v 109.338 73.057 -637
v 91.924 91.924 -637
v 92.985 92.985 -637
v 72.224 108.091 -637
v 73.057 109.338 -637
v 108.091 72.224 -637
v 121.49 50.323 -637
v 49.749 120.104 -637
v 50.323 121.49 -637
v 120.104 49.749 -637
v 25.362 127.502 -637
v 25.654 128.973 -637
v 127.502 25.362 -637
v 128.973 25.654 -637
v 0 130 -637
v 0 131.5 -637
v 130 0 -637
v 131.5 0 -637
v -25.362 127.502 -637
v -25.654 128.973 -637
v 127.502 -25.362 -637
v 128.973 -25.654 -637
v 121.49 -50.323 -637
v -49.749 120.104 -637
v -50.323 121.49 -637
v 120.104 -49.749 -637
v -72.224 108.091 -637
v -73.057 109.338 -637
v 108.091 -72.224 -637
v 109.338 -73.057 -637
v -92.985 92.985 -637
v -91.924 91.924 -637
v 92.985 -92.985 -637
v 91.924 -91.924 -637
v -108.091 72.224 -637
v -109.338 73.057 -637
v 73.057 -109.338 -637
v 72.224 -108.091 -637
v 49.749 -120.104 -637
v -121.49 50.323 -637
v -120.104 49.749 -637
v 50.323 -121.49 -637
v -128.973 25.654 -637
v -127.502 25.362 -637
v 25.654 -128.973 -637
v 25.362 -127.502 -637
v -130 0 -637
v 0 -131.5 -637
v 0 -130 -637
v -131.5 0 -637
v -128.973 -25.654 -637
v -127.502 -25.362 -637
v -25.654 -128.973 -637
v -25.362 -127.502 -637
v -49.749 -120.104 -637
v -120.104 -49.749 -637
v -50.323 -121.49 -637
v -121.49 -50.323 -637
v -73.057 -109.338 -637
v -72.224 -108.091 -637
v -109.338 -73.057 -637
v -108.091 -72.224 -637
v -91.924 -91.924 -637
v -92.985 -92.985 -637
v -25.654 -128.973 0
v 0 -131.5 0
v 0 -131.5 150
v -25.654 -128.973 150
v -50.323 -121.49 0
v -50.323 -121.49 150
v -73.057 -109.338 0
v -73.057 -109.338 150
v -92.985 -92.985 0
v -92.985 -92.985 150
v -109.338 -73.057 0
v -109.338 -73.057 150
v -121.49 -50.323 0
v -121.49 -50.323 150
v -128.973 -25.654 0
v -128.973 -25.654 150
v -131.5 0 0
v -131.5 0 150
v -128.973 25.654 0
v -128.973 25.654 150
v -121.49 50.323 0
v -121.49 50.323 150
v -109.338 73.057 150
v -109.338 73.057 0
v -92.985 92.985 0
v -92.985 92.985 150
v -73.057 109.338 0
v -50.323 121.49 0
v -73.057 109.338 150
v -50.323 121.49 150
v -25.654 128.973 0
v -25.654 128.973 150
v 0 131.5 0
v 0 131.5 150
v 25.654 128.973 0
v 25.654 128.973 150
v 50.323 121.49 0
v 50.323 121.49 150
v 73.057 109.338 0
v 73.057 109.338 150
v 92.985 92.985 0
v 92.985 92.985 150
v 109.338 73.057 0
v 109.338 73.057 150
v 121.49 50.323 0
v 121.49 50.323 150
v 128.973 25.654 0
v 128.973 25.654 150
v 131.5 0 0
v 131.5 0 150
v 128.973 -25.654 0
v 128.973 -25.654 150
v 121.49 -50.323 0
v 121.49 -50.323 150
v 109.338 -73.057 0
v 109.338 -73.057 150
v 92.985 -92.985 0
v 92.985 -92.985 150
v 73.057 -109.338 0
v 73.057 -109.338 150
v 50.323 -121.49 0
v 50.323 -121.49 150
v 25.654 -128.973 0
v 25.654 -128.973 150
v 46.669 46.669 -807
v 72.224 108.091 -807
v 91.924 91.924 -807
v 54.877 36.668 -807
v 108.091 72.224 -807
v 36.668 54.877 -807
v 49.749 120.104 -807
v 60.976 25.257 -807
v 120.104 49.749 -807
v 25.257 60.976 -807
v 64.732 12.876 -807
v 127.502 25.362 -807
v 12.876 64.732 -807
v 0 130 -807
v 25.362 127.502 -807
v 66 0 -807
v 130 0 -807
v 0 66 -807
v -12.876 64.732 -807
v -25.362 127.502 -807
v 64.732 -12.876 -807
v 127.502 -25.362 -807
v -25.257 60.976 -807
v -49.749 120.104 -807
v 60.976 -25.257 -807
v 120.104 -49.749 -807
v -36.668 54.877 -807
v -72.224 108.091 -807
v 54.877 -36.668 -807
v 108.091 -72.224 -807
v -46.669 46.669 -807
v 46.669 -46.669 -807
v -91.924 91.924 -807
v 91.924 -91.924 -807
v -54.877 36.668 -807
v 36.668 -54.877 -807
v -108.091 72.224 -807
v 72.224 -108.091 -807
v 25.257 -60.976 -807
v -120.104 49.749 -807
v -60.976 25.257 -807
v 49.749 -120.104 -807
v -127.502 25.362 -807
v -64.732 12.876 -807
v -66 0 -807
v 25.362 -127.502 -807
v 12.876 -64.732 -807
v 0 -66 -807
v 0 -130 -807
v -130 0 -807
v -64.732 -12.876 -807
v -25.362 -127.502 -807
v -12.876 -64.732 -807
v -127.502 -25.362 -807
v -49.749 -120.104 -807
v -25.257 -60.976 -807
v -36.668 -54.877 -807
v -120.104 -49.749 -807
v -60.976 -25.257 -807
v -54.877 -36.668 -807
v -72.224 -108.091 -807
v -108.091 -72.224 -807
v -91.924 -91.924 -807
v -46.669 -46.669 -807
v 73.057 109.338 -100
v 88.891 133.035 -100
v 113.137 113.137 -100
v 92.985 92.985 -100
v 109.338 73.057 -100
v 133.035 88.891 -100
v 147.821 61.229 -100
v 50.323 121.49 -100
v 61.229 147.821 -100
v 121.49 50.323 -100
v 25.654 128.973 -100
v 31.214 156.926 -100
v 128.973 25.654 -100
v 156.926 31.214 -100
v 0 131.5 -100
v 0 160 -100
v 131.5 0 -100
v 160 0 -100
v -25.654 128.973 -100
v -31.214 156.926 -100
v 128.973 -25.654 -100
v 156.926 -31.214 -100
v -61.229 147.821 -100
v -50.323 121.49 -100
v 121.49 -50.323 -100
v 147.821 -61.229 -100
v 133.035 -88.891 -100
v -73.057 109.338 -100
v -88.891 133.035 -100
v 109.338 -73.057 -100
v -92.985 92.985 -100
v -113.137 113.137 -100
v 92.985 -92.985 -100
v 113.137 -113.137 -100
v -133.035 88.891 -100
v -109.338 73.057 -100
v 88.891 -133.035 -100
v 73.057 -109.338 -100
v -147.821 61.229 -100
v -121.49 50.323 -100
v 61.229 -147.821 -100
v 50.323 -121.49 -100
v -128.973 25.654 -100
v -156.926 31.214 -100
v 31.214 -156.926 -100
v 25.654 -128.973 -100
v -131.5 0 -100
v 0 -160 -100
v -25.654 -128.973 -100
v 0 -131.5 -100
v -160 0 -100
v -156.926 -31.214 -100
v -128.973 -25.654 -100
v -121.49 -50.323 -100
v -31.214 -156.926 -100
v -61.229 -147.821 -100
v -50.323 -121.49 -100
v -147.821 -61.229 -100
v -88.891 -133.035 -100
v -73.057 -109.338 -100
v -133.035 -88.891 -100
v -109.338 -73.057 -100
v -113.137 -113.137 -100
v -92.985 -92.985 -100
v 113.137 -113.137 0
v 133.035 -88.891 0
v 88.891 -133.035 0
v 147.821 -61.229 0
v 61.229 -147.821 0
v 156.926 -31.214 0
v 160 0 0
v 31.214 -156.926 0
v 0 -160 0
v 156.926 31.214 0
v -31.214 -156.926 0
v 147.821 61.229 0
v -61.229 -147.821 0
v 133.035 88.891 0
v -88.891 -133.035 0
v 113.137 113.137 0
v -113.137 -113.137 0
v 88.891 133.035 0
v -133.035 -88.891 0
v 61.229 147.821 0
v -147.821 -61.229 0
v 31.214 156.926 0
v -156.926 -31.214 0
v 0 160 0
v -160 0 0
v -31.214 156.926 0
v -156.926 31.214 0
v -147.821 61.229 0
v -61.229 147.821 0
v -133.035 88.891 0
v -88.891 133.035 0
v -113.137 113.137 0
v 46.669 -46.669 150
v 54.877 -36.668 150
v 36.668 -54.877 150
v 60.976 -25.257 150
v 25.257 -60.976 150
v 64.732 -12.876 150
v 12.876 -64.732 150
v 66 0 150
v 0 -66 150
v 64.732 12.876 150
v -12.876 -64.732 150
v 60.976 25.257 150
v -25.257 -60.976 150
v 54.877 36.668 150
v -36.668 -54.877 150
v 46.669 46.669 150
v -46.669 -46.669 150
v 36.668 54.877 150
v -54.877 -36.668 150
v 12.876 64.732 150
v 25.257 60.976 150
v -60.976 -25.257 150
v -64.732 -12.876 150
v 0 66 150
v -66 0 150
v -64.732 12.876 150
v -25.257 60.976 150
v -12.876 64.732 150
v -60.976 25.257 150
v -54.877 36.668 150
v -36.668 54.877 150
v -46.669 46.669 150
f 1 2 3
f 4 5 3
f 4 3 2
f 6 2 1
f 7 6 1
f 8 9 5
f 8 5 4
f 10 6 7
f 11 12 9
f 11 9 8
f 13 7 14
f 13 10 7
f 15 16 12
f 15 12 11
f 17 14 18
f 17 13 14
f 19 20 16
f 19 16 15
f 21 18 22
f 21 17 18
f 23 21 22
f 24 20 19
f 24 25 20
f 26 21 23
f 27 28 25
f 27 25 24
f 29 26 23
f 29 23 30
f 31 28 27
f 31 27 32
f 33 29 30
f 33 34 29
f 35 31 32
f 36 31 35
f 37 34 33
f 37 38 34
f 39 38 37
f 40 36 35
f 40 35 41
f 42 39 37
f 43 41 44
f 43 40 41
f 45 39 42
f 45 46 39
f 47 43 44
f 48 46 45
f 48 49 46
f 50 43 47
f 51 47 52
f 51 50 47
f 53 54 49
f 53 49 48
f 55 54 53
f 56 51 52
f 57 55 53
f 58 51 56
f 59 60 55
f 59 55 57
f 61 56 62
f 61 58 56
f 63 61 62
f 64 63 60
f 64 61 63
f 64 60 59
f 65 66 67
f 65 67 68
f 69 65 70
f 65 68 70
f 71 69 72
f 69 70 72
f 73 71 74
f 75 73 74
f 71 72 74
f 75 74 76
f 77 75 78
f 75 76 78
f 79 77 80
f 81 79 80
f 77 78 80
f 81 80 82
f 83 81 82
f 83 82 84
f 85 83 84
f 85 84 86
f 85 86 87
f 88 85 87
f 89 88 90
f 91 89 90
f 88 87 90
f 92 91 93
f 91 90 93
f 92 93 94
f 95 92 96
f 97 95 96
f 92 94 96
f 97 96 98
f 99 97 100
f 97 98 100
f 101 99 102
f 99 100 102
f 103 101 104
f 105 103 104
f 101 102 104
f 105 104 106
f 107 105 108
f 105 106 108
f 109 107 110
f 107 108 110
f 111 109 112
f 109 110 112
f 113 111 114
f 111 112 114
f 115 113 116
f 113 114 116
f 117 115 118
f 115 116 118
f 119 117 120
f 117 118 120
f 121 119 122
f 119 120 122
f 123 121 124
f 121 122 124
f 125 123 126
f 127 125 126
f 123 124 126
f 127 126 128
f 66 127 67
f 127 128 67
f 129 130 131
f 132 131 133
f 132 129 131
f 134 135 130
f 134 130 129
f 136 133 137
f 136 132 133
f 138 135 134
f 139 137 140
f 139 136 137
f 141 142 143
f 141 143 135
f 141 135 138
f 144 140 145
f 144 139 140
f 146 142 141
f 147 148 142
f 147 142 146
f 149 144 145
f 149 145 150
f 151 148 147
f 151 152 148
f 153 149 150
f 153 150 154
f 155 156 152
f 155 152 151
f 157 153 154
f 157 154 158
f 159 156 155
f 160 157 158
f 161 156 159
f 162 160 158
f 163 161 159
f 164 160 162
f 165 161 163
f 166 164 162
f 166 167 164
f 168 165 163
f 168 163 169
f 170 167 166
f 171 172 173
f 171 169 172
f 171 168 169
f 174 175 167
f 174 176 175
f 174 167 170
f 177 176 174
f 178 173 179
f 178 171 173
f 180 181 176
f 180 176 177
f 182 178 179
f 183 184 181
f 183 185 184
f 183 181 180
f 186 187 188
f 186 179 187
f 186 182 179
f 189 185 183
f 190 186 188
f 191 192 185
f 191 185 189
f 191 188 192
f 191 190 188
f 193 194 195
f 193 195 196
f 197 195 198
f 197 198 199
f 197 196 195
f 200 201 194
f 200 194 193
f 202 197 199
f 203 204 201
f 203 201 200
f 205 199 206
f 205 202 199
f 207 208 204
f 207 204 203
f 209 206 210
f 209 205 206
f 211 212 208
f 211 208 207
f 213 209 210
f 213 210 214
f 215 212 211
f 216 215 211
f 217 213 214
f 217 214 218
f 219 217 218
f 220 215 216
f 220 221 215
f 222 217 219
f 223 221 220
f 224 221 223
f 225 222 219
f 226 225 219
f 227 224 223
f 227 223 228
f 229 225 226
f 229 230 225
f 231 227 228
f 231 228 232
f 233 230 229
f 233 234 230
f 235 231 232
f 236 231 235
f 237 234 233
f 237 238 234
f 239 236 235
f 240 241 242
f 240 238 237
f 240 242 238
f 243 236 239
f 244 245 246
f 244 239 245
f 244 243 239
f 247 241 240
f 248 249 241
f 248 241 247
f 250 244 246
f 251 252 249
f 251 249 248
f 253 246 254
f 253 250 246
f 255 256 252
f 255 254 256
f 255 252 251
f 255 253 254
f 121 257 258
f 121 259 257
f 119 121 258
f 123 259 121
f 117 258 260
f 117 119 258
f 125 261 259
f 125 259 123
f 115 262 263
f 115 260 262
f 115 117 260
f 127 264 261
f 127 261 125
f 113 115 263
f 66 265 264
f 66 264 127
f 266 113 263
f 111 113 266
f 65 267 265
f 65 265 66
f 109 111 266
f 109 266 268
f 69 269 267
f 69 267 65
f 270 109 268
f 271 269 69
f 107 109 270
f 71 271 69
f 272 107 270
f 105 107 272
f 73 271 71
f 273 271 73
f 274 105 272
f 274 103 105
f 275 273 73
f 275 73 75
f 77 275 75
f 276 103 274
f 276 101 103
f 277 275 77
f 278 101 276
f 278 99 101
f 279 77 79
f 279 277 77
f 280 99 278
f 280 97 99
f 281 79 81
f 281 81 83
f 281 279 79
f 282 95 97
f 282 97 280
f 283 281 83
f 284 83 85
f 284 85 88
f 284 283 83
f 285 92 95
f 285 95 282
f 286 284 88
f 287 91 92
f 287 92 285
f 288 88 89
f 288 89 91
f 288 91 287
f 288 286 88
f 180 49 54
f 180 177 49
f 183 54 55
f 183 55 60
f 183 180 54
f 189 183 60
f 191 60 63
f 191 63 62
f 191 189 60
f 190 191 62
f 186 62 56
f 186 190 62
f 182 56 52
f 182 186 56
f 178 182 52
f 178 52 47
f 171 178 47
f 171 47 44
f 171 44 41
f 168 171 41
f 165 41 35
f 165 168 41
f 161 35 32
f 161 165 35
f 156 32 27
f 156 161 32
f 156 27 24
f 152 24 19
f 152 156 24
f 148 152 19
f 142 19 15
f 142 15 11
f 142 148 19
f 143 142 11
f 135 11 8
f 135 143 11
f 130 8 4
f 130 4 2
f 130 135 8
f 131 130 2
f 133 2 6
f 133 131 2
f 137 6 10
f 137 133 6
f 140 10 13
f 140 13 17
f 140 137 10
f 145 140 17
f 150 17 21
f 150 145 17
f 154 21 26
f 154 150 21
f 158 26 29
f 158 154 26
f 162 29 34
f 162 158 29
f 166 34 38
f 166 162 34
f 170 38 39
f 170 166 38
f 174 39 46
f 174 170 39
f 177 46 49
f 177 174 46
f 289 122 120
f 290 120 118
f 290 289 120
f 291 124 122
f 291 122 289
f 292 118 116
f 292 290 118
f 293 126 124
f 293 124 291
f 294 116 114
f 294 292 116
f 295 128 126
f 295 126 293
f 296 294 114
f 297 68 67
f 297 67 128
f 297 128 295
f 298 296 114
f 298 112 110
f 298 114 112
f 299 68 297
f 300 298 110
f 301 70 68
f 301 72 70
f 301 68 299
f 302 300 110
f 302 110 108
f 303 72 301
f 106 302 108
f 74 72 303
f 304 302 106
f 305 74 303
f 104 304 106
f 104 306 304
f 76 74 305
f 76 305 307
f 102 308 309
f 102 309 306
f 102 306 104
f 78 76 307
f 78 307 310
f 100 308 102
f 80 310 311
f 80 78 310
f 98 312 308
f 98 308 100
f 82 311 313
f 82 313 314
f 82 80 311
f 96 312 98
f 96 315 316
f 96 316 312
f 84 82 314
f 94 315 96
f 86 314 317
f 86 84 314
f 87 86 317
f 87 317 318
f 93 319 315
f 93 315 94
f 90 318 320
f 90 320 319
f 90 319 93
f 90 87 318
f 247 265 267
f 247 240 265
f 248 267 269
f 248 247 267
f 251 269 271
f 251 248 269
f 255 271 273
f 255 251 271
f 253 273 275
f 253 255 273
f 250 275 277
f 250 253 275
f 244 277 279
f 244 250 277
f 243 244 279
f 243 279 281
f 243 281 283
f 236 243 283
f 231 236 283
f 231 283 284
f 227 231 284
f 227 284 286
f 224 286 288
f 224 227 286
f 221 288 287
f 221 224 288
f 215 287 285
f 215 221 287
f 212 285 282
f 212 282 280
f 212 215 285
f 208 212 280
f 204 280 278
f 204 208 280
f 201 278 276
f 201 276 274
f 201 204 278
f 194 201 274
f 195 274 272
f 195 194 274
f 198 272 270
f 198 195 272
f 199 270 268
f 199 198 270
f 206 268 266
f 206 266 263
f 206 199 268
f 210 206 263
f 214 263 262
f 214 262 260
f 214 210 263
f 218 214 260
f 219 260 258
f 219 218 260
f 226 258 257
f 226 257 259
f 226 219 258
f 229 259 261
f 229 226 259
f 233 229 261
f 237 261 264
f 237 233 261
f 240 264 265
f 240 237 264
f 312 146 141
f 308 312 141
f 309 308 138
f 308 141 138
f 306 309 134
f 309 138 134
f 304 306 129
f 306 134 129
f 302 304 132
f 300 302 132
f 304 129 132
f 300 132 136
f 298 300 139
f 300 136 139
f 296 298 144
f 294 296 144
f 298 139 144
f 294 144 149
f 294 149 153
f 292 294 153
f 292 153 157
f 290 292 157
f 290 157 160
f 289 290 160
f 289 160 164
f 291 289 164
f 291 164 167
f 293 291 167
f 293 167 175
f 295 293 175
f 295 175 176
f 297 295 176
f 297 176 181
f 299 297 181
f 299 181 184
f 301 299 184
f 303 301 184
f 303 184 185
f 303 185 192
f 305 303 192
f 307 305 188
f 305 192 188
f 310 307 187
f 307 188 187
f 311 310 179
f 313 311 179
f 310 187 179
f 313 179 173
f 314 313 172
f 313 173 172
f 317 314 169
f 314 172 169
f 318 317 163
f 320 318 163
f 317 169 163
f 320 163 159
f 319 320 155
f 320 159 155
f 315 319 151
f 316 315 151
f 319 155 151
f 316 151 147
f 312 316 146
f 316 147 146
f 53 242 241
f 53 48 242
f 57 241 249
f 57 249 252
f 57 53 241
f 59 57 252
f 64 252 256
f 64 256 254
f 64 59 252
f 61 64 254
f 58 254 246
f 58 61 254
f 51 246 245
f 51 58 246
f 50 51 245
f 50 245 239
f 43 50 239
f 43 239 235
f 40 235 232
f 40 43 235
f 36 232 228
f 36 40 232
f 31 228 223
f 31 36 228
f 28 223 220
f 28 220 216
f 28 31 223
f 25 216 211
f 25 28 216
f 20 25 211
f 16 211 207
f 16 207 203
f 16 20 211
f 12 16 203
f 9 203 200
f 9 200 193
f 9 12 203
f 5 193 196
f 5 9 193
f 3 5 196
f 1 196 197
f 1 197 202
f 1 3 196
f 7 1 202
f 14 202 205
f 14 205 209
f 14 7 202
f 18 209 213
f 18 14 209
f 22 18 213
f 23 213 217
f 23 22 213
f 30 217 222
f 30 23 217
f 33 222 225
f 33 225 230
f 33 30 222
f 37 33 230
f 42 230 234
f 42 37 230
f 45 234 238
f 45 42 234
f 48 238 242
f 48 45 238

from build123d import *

# Parameters (mm, degrees)
SKETCH2_R          = 66
CUT_EXTRUDE1_DEPTH = 984.386495738


with BuildPart() as part:
    # Sketch1 → Revolve1 (revolve)
    with BuildSketch(Plane(origin=(0, 0, 0), x_dir=(0, 0, -1), z_dir=(1, 0, 0)), mode=Mode.PRIVATE) as revolve1_sk:
        Polygon((0, 160), (100, 160), (100, 131.5), (637, 131.5), (637, 130), (807, 130), (807, 0), (-150, 0), (-150, 131.5), (-100, 131.5), (-50, 131.5), (0, 131.5), align=None)
    revolve(revolve1_sk.sketch.rotate(Axis((0, 0, 150), (0, 0, -1)), 180), axis=Axis((0, 0, 150), (0, 0, -1)))

    # Sketch2 → Cut-Extrude1 (cut, through all)
    with BuildSketch(Plane(origin=(0, 0, -807), x_dir=(-1, 0, 0), z_dir=(0, 0, -1))):
        with Locations(Location((0, 0, 0), (0, 0, 90))):
            Circle(SKETCH2_R)
    extrude(amount=-CUT_EXTRUDE1_DEPTH, mode=Mode.SUBTRACT)


solid = part.part
